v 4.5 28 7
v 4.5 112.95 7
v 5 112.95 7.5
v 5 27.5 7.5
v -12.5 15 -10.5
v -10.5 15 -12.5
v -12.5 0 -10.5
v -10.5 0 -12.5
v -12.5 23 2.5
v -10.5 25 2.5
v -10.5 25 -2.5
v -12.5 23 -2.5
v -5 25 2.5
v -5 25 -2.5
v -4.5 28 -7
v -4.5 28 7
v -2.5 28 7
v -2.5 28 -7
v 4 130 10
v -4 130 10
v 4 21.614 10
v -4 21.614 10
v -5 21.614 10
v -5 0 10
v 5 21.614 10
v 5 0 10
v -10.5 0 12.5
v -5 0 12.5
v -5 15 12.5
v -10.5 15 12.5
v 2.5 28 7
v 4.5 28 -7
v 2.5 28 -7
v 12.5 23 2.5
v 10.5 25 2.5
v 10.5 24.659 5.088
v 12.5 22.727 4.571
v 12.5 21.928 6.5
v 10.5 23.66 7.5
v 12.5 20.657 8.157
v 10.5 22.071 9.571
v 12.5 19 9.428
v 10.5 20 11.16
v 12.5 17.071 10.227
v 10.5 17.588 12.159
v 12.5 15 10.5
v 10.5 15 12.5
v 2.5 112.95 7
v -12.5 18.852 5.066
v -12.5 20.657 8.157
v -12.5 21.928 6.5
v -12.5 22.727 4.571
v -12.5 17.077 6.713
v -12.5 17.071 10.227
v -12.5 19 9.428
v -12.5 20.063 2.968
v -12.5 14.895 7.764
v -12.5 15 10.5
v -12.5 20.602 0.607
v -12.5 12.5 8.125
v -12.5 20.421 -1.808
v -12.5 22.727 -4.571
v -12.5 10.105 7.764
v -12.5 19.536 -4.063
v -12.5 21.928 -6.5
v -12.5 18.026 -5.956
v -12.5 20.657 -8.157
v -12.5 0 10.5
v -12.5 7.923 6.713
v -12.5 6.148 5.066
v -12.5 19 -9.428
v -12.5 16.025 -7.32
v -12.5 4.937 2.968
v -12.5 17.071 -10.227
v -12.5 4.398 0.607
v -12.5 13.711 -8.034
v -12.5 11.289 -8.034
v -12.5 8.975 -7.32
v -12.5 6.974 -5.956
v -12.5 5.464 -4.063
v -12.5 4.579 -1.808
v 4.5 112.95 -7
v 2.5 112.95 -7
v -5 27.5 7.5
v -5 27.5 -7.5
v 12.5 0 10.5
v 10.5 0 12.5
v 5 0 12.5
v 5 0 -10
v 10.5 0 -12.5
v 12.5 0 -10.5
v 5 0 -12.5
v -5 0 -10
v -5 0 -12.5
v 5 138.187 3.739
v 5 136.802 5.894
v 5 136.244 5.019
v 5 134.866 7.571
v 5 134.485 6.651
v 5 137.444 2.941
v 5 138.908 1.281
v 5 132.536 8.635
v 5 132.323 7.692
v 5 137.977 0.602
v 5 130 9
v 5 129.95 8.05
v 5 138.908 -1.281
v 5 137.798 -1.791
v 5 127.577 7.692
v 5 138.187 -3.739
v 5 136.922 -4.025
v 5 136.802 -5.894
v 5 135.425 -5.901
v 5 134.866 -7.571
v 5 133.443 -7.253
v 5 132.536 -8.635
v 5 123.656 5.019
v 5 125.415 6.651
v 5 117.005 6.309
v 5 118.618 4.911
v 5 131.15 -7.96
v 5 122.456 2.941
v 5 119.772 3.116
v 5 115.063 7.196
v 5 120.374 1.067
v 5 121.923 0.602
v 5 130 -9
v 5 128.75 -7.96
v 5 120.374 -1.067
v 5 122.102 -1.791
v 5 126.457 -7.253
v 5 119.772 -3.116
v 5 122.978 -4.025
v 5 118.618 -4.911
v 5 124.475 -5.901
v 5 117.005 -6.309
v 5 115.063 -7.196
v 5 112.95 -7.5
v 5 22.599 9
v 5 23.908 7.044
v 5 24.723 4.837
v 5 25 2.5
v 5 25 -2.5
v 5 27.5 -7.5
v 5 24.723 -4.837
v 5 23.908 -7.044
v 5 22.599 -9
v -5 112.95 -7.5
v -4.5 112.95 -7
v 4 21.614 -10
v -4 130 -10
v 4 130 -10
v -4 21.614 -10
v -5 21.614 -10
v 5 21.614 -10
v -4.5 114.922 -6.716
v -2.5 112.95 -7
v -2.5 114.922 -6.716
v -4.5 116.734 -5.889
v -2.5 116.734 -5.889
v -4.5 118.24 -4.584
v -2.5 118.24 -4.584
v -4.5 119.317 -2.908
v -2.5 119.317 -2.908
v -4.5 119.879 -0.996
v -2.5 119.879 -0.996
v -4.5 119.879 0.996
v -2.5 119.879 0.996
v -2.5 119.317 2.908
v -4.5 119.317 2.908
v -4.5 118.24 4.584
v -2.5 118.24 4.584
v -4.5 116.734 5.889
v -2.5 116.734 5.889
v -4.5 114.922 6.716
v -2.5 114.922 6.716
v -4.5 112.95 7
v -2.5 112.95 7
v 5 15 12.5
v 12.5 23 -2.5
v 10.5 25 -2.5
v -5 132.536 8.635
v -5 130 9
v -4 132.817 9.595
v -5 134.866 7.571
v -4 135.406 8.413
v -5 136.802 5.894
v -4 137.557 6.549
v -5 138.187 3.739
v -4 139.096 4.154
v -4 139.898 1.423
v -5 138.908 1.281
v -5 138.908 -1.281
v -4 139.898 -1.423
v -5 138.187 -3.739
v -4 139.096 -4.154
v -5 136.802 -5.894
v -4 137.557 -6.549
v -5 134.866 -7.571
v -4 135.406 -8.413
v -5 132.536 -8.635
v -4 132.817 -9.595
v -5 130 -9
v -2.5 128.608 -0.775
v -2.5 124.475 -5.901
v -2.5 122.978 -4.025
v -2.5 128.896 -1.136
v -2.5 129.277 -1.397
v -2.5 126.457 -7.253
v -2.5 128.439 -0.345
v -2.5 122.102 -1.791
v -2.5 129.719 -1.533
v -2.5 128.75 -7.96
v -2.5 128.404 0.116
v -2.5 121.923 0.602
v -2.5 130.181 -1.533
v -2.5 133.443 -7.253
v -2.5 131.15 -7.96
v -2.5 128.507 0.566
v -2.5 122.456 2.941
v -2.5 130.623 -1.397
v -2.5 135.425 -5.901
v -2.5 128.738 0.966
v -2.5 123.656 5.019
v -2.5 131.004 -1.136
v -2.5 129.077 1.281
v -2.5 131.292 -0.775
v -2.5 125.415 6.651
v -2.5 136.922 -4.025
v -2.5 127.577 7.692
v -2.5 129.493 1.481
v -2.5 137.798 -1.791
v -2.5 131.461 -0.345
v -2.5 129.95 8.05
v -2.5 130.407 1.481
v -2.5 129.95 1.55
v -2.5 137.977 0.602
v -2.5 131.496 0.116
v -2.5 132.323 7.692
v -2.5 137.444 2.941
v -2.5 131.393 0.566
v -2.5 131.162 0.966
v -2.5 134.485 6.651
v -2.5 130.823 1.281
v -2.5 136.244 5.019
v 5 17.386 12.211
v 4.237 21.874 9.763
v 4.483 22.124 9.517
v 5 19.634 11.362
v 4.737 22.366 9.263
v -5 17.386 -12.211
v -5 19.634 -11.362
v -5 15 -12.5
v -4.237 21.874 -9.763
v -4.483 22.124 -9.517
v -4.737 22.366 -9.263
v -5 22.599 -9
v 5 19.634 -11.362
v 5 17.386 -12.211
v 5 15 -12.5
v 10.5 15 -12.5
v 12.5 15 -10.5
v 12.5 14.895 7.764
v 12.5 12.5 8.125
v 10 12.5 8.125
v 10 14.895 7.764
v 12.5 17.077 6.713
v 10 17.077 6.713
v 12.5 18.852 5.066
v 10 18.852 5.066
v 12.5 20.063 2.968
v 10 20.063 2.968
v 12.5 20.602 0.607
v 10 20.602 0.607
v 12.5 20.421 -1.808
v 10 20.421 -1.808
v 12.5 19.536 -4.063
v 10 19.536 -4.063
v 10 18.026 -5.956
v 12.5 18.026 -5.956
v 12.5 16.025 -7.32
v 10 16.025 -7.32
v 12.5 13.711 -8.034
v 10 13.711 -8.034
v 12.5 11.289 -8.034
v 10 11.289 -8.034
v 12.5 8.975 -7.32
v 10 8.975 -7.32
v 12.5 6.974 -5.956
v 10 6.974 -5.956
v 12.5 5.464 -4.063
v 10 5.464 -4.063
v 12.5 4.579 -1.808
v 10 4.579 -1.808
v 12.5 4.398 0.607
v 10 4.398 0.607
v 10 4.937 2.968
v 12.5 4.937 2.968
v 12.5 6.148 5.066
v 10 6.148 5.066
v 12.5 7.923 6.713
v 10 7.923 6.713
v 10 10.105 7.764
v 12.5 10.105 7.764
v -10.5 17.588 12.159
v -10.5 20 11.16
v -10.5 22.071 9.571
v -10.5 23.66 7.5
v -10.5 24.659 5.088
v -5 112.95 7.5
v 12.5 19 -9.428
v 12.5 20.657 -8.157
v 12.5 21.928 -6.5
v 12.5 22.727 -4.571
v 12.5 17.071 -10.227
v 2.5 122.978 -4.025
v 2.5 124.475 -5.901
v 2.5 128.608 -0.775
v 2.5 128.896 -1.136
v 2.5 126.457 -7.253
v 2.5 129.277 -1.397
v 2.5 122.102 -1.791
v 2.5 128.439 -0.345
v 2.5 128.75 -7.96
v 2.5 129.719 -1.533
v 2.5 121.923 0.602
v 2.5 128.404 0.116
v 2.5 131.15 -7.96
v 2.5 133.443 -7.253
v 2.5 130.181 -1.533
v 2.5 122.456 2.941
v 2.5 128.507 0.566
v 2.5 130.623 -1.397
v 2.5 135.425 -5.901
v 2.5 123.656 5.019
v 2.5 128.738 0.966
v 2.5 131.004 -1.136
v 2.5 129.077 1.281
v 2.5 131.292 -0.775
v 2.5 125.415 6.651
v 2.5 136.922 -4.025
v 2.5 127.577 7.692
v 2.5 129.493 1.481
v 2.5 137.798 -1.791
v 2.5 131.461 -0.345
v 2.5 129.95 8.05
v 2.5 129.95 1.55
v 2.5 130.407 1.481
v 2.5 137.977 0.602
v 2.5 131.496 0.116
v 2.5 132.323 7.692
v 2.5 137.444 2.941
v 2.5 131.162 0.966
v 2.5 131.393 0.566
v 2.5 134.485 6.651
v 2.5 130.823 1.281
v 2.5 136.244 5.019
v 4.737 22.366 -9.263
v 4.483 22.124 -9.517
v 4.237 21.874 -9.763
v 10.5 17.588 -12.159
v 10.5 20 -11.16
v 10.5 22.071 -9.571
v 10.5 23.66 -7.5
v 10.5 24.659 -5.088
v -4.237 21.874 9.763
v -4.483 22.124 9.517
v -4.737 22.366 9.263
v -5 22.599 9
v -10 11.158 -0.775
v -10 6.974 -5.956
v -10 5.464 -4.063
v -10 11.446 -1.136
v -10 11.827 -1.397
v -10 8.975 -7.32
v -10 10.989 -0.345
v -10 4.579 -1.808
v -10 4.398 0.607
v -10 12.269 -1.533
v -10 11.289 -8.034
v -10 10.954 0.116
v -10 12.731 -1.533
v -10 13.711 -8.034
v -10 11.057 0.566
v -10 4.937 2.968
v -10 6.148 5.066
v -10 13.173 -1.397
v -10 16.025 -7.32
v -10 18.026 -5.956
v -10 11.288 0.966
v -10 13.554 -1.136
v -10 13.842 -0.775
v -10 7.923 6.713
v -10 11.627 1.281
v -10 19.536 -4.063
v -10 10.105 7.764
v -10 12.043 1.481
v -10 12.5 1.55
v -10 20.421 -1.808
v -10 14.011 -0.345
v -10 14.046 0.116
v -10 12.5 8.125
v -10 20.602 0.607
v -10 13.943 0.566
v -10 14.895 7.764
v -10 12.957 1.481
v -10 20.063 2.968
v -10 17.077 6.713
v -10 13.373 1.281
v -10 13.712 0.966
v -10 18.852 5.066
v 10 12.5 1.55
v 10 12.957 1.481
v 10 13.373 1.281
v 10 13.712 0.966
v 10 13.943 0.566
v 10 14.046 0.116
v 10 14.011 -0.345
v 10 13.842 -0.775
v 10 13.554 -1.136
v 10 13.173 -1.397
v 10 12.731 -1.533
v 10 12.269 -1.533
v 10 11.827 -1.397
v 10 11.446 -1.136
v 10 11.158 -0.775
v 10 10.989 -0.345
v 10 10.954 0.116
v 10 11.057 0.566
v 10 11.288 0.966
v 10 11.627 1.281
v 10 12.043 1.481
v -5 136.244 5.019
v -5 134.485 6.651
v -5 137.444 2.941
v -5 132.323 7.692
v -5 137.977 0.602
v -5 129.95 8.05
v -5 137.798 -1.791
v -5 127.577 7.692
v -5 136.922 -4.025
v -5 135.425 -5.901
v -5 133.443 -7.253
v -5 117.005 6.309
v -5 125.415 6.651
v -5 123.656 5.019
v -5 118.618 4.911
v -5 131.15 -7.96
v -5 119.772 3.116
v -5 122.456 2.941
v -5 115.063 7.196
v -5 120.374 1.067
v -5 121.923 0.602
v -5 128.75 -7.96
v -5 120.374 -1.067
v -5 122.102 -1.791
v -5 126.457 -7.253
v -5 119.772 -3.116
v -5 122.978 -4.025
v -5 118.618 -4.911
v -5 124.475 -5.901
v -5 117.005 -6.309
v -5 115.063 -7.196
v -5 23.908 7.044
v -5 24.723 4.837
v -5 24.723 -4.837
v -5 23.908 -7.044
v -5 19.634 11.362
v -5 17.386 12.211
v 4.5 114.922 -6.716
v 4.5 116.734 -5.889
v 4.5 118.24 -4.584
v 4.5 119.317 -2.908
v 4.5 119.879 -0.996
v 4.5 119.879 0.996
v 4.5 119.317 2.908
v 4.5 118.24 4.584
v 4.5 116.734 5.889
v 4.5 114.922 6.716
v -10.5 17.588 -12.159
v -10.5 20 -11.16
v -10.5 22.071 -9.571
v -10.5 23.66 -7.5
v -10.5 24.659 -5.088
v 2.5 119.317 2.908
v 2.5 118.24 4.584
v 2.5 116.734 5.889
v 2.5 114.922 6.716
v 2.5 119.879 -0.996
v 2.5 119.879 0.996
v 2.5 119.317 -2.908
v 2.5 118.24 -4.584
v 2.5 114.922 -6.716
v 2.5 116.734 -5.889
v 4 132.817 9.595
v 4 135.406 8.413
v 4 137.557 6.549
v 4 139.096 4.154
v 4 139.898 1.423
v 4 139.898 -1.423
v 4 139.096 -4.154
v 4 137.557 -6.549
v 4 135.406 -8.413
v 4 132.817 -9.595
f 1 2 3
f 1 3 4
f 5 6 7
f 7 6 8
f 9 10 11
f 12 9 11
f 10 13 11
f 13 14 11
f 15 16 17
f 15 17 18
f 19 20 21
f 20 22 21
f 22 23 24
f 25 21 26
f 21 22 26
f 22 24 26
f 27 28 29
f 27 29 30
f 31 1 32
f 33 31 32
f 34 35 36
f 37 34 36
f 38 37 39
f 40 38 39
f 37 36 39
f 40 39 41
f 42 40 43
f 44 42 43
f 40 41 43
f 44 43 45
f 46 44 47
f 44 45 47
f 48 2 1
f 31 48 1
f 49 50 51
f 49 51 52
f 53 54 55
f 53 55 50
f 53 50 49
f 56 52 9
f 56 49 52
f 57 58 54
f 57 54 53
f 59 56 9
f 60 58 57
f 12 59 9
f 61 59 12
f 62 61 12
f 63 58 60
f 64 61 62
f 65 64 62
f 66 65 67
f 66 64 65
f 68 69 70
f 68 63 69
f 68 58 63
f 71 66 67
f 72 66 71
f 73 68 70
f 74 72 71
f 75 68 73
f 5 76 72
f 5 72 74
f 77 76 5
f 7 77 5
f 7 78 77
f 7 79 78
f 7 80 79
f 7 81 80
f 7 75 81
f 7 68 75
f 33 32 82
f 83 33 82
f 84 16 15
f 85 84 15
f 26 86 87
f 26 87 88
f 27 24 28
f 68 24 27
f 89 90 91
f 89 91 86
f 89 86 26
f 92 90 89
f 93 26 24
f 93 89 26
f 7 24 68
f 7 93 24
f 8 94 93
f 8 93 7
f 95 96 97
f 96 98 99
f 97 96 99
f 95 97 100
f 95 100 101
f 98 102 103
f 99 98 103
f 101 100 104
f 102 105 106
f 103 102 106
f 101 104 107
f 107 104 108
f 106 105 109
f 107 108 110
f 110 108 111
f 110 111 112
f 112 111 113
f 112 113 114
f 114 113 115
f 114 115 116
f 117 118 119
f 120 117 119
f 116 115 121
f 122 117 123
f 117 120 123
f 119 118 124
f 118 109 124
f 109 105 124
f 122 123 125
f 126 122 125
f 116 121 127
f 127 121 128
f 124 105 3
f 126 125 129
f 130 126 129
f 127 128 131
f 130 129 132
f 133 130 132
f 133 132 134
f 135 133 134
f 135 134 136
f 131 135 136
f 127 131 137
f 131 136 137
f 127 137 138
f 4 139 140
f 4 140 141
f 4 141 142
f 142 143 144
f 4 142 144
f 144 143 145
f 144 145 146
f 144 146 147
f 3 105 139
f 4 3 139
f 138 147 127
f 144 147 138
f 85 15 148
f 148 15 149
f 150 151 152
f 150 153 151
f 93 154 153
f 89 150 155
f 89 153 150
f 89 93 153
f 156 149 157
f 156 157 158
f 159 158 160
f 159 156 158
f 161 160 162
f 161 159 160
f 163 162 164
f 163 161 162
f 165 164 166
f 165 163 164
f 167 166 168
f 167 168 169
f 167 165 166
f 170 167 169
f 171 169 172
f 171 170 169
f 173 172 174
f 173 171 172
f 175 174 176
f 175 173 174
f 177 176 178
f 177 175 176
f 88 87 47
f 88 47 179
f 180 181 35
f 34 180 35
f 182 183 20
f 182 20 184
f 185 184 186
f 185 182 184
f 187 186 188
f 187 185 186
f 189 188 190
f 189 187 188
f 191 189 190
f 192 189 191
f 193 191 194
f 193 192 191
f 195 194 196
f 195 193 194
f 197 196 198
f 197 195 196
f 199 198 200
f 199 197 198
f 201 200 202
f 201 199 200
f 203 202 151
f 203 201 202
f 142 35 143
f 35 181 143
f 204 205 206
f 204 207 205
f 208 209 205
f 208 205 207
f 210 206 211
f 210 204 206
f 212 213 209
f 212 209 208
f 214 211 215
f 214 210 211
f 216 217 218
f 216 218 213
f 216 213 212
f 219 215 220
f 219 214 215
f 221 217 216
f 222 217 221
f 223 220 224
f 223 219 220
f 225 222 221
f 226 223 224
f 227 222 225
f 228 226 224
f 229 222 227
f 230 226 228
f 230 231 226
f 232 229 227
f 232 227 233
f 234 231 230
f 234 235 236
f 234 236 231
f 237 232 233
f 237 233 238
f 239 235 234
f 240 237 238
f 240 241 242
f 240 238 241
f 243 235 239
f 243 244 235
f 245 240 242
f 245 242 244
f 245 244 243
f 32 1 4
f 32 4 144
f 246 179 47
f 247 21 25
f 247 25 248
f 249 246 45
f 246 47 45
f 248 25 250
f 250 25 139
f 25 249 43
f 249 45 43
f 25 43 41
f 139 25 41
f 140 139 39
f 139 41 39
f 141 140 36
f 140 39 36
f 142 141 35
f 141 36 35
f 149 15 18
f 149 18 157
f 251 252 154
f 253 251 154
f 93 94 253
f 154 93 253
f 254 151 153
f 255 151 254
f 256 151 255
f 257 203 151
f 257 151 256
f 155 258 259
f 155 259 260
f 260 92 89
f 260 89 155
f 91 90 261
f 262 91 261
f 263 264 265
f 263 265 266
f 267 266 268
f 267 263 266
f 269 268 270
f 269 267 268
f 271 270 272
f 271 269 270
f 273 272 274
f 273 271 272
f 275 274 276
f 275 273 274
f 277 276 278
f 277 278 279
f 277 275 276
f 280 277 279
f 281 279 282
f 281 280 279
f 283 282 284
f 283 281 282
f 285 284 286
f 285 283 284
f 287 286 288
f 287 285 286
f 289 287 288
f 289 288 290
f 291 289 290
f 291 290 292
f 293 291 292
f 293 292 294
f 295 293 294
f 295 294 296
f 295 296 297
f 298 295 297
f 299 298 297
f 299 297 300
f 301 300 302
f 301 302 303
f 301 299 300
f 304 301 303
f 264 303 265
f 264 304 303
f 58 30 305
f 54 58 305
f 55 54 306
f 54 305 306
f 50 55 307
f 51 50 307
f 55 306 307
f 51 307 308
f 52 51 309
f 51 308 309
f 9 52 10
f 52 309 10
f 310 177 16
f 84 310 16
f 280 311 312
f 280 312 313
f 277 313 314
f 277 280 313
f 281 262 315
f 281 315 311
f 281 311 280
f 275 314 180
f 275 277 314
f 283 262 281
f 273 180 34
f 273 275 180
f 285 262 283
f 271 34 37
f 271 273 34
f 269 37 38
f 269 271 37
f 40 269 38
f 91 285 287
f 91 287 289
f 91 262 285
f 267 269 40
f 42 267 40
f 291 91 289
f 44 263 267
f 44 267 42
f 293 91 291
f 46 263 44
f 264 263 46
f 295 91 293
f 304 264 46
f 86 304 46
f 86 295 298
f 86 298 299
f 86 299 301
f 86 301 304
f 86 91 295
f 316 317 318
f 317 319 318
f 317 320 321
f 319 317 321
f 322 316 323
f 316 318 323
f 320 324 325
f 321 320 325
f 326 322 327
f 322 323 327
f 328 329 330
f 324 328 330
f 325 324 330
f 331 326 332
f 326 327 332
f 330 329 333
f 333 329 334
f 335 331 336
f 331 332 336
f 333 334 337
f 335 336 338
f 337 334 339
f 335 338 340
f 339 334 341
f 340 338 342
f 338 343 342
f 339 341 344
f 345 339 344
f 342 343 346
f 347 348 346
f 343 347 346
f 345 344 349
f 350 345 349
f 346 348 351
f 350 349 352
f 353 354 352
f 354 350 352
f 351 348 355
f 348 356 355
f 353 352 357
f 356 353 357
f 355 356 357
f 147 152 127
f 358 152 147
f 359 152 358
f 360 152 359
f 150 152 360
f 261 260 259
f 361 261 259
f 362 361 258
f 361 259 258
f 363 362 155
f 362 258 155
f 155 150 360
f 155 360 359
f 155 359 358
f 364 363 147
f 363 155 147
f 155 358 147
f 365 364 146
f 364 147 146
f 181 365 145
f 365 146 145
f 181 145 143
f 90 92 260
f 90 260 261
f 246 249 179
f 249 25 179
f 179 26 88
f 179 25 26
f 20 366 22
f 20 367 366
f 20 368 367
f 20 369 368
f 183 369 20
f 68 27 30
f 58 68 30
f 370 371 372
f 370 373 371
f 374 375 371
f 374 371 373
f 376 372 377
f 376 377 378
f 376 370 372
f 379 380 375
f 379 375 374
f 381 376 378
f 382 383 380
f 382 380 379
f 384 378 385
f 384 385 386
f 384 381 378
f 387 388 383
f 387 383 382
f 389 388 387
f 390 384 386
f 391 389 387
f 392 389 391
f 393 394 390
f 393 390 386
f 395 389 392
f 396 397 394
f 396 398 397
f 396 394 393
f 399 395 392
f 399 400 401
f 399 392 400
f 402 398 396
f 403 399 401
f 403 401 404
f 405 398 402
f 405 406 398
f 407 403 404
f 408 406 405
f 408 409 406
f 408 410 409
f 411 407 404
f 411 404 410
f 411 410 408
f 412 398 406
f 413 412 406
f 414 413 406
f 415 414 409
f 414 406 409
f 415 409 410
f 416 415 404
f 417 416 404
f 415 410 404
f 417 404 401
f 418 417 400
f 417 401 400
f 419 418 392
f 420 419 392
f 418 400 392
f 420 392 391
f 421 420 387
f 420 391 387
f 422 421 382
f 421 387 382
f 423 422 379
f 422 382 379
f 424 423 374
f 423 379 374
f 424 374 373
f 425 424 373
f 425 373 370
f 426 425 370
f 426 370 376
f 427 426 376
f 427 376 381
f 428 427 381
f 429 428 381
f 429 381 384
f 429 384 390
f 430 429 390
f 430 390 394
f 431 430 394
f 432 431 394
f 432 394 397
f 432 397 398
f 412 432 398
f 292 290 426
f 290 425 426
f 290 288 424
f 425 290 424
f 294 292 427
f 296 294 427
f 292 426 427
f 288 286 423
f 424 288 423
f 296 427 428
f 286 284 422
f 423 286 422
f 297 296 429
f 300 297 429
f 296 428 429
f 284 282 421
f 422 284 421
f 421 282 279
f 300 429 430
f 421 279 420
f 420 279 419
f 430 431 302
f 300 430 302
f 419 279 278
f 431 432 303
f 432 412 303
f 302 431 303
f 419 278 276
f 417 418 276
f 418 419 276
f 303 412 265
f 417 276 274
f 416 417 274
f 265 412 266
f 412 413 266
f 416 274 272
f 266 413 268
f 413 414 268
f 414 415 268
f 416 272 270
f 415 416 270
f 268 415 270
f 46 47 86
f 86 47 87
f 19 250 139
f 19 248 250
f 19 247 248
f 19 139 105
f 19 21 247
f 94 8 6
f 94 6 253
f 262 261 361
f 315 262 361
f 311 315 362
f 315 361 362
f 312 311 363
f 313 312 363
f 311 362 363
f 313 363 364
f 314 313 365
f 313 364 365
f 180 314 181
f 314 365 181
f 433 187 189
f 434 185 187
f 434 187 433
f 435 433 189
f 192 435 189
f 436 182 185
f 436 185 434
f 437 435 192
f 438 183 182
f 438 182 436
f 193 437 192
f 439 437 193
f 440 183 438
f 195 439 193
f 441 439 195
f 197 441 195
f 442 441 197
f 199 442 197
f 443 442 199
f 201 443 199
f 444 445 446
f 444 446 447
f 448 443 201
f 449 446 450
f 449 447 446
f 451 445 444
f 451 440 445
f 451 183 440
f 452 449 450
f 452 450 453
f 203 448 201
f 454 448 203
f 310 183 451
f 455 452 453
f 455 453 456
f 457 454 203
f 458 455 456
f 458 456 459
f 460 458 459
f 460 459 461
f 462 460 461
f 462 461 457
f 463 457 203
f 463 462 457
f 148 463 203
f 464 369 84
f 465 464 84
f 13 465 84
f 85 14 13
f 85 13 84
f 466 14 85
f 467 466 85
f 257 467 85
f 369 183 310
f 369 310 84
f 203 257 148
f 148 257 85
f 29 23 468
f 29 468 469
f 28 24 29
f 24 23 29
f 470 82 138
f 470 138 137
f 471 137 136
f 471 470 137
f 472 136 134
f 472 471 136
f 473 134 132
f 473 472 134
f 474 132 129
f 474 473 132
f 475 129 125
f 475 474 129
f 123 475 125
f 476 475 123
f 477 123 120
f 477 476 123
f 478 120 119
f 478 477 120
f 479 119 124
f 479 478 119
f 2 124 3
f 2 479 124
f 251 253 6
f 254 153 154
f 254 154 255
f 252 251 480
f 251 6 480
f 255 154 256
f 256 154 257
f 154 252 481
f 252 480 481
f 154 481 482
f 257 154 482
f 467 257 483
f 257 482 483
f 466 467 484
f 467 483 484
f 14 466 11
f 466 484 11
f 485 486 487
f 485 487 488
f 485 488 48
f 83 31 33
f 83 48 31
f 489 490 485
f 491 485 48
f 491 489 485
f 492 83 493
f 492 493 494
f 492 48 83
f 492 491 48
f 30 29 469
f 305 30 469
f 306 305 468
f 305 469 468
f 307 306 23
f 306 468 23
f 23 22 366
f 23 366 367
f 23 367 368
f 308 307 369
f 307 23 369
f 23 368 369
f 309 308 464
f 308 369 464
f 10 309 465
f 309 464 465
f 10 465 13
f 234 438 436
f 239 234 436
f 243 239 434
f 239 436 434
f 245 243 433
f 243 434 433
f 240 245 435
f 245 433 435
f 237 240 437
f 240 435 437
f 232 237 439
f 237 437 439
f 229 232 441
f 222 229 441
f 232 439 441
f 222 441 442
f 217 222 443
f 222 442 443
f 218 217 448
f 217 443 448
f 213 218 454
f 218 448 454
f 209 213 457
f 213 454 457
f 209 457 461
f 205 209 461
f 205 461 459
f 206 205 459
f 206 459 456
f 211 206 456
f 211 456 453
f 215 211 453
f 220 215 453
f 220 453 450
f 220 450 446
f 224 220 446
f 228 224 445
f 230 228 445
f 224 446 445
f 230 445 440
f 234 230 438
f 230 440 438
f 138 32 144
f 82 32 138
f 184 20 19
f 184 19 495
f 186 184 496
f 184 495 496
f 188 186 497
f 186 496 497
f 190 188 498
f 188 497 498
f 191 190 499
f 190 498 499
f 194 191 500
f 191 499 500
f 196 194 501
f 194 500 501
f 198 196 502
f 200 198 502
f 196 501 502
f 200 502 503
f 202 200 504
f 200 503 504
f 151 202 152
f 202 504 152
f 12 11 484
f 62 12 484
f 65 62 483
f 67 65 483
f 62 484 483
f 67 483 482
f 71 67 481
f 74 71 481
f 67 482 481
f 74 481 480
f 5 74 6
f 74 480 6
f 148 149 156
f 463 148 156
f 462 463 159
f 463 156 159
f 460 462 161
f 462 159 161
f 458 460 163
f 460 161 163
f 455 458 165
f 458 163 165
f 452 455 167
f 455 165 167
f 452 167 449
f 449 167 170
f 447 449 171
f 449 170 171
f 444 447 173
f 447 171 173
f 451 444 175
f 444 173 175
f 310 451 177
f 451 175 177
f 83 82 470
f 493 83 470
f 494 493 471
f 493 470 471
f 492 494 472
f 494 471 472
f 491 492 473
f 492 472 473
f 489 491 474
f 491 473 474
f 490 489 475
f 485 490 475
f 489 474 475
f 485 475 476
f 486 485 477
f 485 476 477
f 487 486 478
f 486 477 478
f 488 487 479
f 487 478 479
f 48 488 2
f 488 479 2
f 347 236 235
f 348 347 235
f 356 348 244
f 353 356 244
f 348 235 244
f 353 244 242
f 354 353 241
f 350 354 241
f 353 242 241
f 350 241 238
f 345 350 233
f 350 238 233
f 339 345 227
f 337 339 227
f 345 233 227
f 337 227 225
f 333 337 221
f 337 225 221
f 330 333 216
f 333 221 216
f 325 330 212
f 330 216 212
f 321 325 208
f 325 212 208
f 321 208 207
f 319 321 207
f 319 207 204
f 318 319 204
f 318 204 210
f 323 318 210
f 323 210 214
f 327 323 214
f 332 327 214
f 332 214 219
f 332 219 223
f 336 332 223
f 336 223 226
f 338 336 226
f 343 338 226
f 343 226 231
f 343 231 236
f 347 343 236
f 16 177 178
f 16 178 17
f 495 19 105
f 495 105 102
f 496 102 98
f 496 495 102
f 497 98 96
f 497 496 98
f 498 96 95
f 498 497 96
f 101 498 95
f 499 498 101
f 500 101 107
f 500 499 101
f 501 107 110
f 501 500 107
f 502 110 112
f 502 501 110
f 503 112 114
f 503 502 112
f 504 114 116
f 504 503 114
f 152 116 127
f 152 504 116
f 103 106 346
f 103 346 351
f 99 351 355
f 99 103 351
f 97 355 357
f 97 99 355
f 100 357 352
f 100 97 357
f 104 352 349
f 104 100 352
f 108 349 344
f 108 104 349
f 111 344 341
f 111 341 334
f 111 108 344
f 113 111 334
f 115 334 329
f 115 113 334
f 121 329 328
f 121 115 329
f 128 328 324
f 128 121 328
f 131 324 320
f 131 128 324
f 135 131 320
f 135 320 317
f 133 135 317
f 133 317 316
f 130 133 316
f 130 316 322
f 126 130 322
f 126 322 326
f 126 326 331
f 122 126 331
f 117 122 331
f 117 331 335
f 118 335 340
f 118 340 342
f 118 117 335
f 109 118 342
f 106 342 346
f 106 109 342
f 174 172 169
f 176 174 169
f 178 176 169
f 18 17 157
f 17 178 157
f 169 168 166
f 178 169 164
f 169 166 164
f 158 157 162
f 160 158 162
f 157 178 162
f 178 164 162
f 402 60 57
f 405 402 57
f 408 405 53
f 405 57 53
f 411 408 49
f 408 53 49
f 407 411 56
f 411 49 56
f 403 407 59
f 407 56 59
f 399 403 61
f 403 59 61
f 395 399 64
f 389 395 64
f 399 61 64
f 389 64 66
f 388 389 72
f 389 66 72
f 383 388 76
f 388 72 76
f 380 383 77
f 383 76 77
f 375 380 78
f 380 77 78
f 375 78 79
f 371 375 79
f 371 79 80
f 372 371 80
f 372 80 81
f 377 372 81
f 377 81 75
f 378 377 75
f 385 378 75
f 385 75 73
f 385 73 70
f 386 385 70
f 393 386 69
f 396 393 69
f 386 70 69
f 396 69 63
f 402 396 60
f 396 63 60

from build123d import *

# Parameters (mm, degrees)
BASE_W              = 10
BASE_H              = 20
BOSS_EXTRUDE1_DEPTH = 25
SKETCH2_R           = 8.125
SKETCH2_R_2         = 1.55
CUT_EXTRUDE1_DEPTH  = 2.5
SKETCH2_2_R         = 1.55
CUT_EXTRUDE2_DEPTH  = 38.5
BOSS_EXTRUDE2_START = 25
BASE_3_W            = 10
BASE_3_H            = 20
BOSS_EXTRUDE2_DEPTH = 115
BEARING_R           = 8.05
BEARING_R_2         = 1.55
CUT_EXTRUDE3_DEPTH  = 2.5
FILLET1_R           = 10
CHAMFER1_SIZE       = 2
CUT_EXTRUDE5_DEPTH  = 2.5
BEARING_2_R         = 1.55
CUT_EXTRUDE6_DEPTH  = 142.642154742
CHAMFER2_SIZE       = 1
CHAMFER3_SIZE       = 0.5


with BuildPart() as part:
    # Base → Boss-Extrude1 (new body)
    with BuildSketch(Plane(origin=(0, 0, 0), x_dir=(1, 0, 0), z_dir=(0, 1, 0))):
        Polygon((5, -12.5), (5, -10), (5, 10), (5, 12.5), (12.5, 12.5), (12.5, -12.5), align=None)
        Rectangle(BASE_W, BASE_H)
        Polygon((-5, 10), (-5, -10), (-5, -12.5), (-12.5, -12.5), (-12.5, 12.5), (-5, 12.5), align=None)
    extrude(amount=BOSS_EXTRUDE1_DEPTH)

    # Sketch2 → Cut-Extrude1 (cut)
    with BuildSketch(Plane.ZY.offset(12.5)):
        with Locations((0, 12.5)):
            Circle(SKETCH2_R)
        with Locations((0, 12.5)):
            Circle(SKETCH2_R_2, mode=Mode.SUBTRACT)
    cut_extrude1 = extrude(amount=-CUT_EXTRUDE1_DEPTH, mode=Mode.SUBTRACT)

    # Sketch2<2> → Cut-Extrude2 (cut, through all)
    with BuildSketch(Plane.ZY.offset(12.5)):
        with Locations((0, 12.5)):
            Circle(SKETCH2_2_R)
    extrude(amount=-CUT_EXTRUDE2_DEPTH, mode=Mode.SUBTRACT)

    # Base<3> → Boss-Extrude2 (add)
    with BuildSketch(Plane(origin=(0, 0, 0), x_dir=(1, 0, 0), z_dir=(0, 1, 0)).offset(BOSS_EXTRUDE2_START)):
        Rectangle(BASE_3_W, BASE_3_H)
    extrude(amount=BOSS_EXTRUDE2_DEPTH)

    # Mirror1: Cut-Extrude1 across plane
    add(cut_extrude1.mirror(Plane.ZY), mode=Mode.SUBTRACT)

    # Bearing → Cut-Extrude3 (cut)
    with BuildSketch(Plane.ZY.offset(5)):
        with Locations((0, 129.95)):
            Circle(BEARING_R)
        with Locations((0, 129.95)):
            Circle(BEARING_R_2, mode=Mode.SUBTRACT)
    cut_extrude3 = extrude(amount=-CUT_EXTRUDE3_DEPTH, mode=Mode.SUBTRACT)

    # Fillet1
    # the kernel refuses this fillet: 10 mm, written as the material it takes off along each edge
    with BuildSketch(Plane(origin=(37.5, 25, 12.5), x_dir=(0, -1, 0), z_dir=(-1, 0, 0)), Plane(origin=(5, 25, -12.5), x_dir=(0, -1, 0), z_dir=(1, 0, 0))) as fillet1_piece_1:
        with BuildLine():
            CenterArc((FILLET1_R, -FILLET1_R), FILLET1_R, 90, 90)
            Line((0, -FILLET1_R), (0, 0))
            Line((0, 0), (FILLET1_R, 0))
        make_face()
    extrude(amount=32.5, mode=Mode.SUBTRACT)
    with BuildSketch(Plane(origin=(37.5, 25, 12.5), x_dir=(0, -1, 0), z_dir=(-1, 0, 0))) as fillet1_piece_2_section:
        with BuildLine():
            CenterArc((FILLET1_R, -FILLET1_R), FILLET1_R, 90, 90)
            Line((0, -FILLET1_R), (0, 0))
            Line((0, 0), (FILLET1_R, 0))
        make_face()
    fillet1_piece_2 = extrude(amount=57.5, mode=Mode.PRIVATE)
    fillet1_piece_2 = split(fillet1_piece_2, bisect_by=Plane(origin=(-5, 22.736048857, 10.236048857), z_dir=(-1, 0, 0)), keep=Keep.TOP, mode=Mode.PRIVATE)
    add(fillet1_piece_2, mode=Mode.SUBTRACT)
    with BuildSketch(Plane(origin=(-20, 25, -12.5), x_dir=(0, -1, 0), z_dir=(1, 0, 0))) as fillet1_piece_3_section:
        with BuildLine():
            CenterArc((FILLET1_R, -FILLET1_R), FILLET1_R, 90, 90)
            Line((0, -FILLET1_R), (0, 0))
            Line((0, 0), (FILLET1_R, 0))
        make_face()
    fillet1_piece_3 = extrude(amount=57.5, mode=Mode.PRIVATE)
    fillet1_piece_3 = split(fillet1_piece_3, bisect_by=Plane(origin=(-5, 22.736048857, -10.236048857), z_dir=(-1, 0, 0)), keep=Keep.TOP, mode=Mode.PRIVATE)
    add(fillet1_piece_3, mode=Mode.SUBTRACT)
    with BuildSketch(Plane(origin=(-37.5, 25, -12.5), x_dir=(0, 0, 1), z_dir=(1, 0, 0)), Plane(origin=(-5, 25, 12.5), x_dir=(0, 0, -1), z_dir=(-1, 0, 0))) as fillet1_piece_4:
        with BuildLine():
            CenterArc((FILLET1_R, FILLET1_R), FILLET1_R, 180, 90)
            Line((0, FILLET1_R), (0, 0))
            Line((0, 0), (FILLET1_R, 0))
        make_face()
    extrude(amount=32.5, mode=Mode.SUBTRACT)
    with BuildSketch(Plane(origin=(-37.5, 25, -12.5), x_dir=(0, 0, 1), z_dir=(1, 0, 0))) as fillet1_piece_5_section:
        with BuildLine():
            CenterArc((FILLET1_R, FILLET1_R), FILLET1_R, 180, 90)
            Line((0, FILLET1_R), (0, 0))
            Line((0, 0), (FILLET1_R, 0))
        make_face()
    fillet1_piece_5 = extrude(amount=57.5, mode=Mode.PRIVATE)
    fillet1_piece_5 = split(fillet1_piece_5, bisect_by=Plane(origin=(5, 22.736048857, -10.236048857), z_dir=(1, 0, 0)), keep=Keep.TOP, mode=Mode.PRIVATE)
    add(fillet1_piece_5, mode=Mode.SUBTRACT)
    with BuildSketch(Plane(origin=(20, 25, 12.5), x_dir=(0, 0, -1), z_dir=(-1, 0, 0))) as fillet1_piece_6_section:
        with BuildLine():
            CenterArc((FILLET1_R, FILLET1_R), FILLET1_R, 180, 90)
            Line((0, FILLET1_R), (0, 0))
            Line((0, 0), (FILLET1_R, 0))
        make_face()
    fillet1_piece_6 = extrude(amount=57.5, mode=Mode.PRIVATE)
    fillet1_piece_6 = split(fillet1_piece_6, bisect_by=Plane(origin=(5, 22.736048857, 10.236048857), z_dir=(1, 0, 0)), keep=Keep.TOP, mode=Mode.PRIVATE)
    add(fillet1_piece_6, mode=Mode.SUBTRACT)
    with BuildSketch(Plane(origin=(30, 140, 10), x_dir=(0, -1, 0), z_dir=(-1, 0, 0)), Plane(origin=(-30, 140, -10), x_dir=(0, -1, 0), z_dir=(1, 0, 0))) as fillet1_piece_7:
        with BuildLine():
            CenterArc((FILLET1_R, -FILLET1_R), FILLET1_R, 90, 90)
            Line((0, -FILLET1_R), (0, 0))
            Line((0, 0), (FILLET1_R, 0))
        make_face()
    extrude(amount=60, mode=Mode.SUBTRACT)

    # Chamfer1
    chamfer1_edges = [part.edges().sort_by_distance(p)[0] for p in [
        (12.5, 7.5, -12.5),
        (12.5, 25, 0),
        (12.5, 7.5, 12.5),
        (12.5, 22.071067812, 9.571067812),
        (12.5, 22.071067812, -9.571067812),
        (-12.5, 25, 0),
        (-12.5, 7.5, 12.5),
        (-12.5, 7.5, -12.5),
        (-12.5, 22.071067812, 9.571067812),
        (-12.5, 22.071067812, -9.571067812),
    ]]
    chamfer(chamfer1_edges, length=CHAMFER1_SIZE)

    # Sketch4 → Cut-Extrude5 (cut)
    with BuildSketch(Plane(origin=(5, 0, 0), x_dir=(0, 0, -1), z_dir=(1, 0, 0))):
        with BuildLine():
            Line((-7, 28), (7, 28))
            Line((7, 28), (7, 112.95))
            ThreePointArc((7, 112.95), (0, 119.95), (-7, 112.95))
            Line((-7, 112.95), (-7, 28))
        make_face()
    cut_extrude5 = extrude(amount=-CUT_EXTRUDE5_DEPTH, mode=Mode.SUBTRACT)

    # Mirror2: Cut-Extrude3, Cut-Extrude5 across plane
    add(cut_extrude3.mirror(Plane.ZY), mode=Mode.SUBTRACT)
    add(cut_extrude5.mirror(Plane.ZY), mode=Mode.SUBTRACT)

    # Bearing<2> → Cut-Extrude6 (cut, through all)
    with BuildSketch(Plane.ZY.offset(5)):
        with Locations((0, 129.95)):
            Circle(BEARING_2_R)
    extrude(amount=-CUT_EXTRUDE6_DEPTH, mode=Mode.SUBTRACT)

    # Chamfer2
    chamfer2_edges = [part.edges().sort_by_distance(p)[0] for p in [
        (5, 140, 0),
        (5, 140, 0),
        (5, 75.807189139, 10),
        (-5, 75.807189139, 10),
        (-5, 75.807189139, -10),
        (5, 75.807189139, -10),
        (-5, 140, 0),
        (-5, 140, 0),
    ]]
    chamfer(chamfer2_edges, length=CHAMFER2_SIZE)

    # Chamfer3
    chamfer3_edges = [part.edges().sort_by_distance(p)[0] for p in [
        (5, 119.95, 0),
        (5, 70.475, 7),
        (5, 28, 0),
        (5, 70.475, -7),
        (-5, 119.95, 0),
        (-5, 70.475, 7),
        (-5, 28, 0),
        (-5, 70.475, -7),
    ]]
    chamfer(chamfer3_edges, length=CHAMFER3_SIZE)


solid = part.part
